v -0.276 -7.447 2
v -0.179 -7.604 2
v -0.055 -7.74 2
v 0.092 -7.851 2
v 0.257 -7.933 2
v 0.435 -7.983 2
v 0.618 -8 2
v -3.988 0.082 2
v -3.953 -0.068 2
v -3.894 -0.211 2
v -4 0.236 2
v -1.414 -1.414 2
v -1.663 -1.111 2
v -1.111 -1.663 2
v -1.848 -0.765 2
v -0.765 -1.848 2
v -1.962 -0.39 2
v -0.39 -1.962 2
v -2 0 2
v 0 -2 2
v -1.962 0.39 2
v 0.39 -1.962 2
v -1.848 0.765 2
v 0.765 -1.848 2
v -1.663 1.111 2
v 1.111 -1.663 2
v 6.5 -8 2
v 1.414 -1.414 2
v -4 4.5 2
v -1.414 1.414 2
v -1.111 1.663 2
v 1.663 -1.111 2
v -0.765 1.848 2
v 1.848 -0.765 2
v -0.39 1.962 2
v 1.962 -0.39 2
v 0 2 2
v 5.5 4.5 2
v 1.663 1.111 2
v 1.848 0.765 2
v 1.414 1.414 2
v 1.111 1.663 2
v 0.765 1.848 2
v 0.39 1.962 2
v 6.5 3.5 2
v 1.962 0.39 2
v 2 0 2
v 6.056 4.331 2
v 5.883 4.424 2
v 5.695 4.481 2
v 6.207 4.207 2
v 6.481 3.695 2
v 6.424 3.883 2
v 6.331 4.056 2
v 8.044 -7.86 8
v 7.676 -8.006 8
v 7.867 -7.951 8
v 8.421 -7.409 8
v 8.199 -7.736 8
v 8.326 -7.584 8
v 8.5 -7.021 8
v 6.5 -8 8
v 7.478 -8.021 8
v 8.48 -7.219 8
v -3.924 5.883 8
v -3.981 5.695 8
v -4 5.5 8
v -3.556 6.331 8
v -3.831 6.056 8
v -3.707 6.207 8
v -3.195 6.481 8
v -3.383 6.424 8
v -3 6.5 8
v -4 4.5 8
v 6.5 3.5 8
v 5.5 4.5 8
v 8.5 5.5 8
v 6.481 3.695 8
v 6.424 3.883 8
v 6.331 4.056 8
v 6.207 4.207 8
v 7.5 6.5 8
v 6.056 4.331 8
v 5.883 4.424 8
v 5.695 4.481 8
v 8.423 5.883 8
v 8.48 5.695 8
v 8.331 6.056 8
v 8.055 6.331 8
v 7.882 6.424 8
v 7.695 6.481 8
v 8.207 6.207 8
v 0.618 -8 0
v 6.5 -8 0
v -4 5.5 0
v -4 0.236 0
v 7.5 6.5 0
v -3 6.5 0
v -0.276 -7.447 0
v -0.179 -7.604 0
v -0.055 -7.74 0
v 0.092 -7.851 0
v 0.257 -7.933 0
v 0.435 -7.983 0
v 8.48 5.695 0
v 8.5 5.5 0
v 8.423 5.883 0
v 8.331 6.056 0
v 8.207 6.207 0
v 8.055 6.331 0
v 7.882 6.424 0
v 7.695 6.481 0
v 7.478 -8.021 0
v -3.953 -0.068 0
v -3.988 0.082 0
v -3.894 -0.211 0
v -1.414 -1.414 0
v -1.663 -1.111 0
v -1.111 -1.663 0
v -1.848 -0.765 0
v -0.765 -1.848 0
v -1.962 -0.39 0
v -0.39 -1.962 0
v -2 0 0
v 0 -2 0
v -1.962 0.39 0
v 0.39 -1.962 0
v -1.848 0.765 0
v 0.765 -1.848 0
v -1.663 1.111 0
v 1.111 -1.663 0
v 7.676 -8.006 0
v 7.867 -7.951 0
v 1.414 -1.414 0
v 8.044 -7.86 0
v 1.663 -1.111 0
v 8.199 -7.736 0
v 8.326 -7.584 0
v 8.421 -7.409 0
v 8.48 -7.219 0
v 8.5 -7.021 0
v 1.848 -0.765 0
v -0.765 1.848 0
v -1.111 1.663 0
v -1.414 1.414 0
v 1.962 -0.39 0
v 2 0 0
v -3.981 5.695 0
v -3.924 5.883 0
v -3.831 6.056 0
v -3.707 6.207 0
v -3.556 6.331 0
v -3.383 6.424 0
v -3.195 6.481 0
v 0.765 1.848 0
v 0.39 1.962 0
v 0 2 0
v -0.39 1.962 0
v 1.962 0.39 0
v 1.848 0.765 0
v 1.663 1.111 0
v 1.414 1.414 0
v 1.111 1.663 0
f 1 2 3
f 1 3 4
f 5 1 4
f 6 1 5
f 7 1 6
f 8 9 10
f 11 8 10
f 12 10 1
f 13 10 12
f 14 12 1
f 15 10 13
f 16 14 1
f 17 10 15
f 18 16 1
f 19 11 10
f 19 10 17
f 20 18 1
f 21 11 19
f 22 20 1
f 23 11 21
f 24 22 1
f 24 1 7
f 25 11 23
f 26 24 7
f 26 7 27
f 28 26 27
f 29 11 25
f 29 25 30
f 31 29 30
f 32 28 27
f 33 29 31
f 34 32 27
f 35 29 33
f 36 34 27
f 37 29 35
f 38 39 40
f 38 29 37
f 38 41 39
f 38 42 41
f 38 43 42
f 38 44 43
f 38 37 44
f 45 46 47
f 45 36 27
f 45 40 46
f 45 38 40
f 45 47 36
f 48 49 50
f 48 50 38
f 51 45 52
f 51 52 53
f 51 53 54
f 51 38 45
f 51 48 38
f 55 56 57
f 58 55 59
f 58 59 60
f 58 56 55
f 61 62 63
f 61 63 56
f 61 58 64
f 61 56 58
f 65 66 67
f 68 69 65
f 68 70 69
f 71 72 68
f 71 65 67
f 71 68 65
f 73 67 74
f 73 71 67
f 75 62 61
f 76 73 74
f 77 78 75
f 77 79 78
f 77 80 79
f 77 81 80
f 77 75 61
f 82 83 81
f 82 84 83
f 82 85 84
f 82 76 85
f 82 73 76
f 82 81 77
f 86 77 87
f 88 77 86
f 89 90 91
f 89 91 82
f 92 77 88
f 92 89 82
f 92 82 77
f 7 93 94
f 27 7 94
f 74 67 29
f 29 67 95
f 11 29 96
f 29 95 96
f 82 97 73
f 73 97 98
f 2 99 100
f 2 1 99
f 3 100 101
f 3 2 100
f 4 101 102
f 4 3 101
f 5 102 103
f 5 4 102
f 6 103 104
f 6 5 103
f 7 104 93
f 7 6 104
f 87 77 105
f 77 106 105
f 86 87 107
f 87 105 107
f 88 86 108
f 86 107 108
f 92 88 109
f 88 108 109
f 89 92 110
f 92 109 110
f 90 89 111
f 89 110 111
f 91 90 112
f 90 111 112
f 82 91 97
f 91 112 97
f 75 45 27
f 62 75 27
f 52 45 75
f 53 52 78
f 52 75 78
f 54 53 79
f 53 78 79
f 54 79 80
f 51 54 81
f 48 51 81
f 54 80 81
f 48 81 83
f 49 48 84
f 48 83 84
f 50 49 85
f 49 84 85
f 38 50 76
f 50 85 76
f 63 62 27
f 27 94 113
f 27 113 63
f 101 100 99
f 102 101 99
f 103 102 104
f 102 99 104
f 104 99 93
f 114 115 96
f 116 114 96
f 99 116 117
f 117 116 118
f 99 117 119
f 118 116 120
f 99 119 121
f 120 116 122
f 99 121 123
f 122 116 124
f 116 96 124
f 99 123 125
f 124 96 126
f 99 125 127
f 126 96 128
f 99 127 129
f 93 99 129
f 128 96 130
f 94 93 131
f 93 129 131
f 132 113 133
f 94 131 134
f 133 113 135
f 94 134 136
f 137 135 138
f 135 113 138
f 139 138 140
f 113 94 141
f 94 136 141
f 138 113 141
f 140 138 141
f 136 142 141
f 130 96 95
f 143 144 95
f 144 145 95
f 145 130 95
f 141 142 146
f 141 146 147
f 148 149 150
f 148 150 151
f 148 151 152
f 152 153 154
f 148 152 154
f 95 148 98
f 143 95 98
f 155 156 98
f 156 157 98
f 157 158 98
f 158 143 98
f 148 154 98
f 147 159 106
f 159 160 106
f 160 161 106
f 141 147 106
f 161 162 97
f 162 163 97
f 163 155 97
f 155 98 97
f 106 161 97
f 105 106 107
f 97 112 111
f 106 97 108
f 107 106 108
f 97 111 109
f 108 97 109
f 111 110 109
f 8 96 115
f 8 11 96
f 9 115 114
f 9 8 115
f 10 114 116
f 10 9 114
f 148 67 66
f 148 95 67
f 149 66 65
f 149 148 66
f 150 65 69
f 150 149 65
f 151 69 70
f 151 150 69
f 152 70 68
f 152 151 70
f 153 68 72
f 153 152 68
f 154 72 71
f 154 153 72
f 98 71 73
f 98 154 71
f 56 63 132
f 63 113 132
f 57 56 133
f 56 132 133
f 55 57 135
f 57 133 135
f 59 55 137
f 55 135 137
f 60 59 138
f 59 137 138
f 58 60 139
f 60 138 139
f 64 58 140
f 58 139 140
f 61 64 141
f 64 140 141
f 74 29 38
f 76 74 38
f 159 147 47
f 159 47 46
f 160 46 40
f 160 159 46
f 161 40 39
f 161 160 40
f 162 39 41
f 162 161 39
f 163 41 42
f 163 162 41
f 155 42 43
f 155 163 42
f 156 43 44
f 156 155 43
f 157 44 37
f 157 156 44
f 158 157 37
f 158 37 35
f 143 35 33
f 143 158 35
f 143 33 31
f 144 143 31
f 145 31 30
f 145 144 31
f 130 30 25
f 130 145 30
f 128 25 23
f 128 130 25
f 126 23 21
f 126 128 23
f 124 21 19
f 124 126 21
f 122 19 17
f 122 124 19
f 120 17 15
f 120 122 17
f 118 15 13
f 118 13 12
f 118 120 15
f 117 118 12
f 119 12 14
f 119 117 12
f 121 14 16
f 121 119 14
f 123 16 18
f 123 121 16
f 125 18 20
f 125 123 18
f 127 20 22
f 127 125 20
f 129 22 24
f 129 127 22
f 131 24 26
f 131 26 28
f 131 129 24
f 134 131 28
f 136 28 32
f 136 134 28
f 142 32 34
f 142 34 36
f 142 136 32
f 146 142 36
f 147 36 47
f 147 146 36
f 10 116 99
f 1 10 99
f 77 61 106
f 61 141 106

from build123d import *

# Parameters (mm, degrees)
F0_R     = 2
F1_DEPTH = 2
F2_DEPTH = 8
F3_R     = 1


with BuildPart() as f1:
    # F0 (on Top) → F1 (new body)
    with BuildSketch(Plane.XY):
        Polygon((-4, 4.5), (-4, 0), (0, -8), (6.5, -8), (6.5, 4.5), align=None)
        Circle(F0_R, mode=Mode.SUBTRACT)
        Polygon((-4, 6.5), (-4, 4.5), (6.5, 4.5), (6.5, -8), (8.499535, -8.043109), (8.499535, 6.5), align=None)
    extrude(amount=F1_DEPTH)

    # F0 (on Top) → F2 (join)
    with BuildSketch(Plane.XY):
        Polygon((-4, 6.5), (-4, 4.5), (6.5, 4.5), (6.5, -8), (8.499535, -8.043109), (8.499535, 6.5), align=None)
    extrude(amount=F2_DEPTH)

    # F3
    f3_edges = [f1.edges().sort_by_distance(p)[0] for p in [
        (6.5, 4.5, 5),
        (8.499535, 6.5, 4),
        (-4, 6.5, 4),
        (-4, 0, 1),
        (0, -8, 1),
        (8.499535, -8.043109, 4),
    ]]
    fillet(f3_edges, radius=F3_R)


solid = f1.part
